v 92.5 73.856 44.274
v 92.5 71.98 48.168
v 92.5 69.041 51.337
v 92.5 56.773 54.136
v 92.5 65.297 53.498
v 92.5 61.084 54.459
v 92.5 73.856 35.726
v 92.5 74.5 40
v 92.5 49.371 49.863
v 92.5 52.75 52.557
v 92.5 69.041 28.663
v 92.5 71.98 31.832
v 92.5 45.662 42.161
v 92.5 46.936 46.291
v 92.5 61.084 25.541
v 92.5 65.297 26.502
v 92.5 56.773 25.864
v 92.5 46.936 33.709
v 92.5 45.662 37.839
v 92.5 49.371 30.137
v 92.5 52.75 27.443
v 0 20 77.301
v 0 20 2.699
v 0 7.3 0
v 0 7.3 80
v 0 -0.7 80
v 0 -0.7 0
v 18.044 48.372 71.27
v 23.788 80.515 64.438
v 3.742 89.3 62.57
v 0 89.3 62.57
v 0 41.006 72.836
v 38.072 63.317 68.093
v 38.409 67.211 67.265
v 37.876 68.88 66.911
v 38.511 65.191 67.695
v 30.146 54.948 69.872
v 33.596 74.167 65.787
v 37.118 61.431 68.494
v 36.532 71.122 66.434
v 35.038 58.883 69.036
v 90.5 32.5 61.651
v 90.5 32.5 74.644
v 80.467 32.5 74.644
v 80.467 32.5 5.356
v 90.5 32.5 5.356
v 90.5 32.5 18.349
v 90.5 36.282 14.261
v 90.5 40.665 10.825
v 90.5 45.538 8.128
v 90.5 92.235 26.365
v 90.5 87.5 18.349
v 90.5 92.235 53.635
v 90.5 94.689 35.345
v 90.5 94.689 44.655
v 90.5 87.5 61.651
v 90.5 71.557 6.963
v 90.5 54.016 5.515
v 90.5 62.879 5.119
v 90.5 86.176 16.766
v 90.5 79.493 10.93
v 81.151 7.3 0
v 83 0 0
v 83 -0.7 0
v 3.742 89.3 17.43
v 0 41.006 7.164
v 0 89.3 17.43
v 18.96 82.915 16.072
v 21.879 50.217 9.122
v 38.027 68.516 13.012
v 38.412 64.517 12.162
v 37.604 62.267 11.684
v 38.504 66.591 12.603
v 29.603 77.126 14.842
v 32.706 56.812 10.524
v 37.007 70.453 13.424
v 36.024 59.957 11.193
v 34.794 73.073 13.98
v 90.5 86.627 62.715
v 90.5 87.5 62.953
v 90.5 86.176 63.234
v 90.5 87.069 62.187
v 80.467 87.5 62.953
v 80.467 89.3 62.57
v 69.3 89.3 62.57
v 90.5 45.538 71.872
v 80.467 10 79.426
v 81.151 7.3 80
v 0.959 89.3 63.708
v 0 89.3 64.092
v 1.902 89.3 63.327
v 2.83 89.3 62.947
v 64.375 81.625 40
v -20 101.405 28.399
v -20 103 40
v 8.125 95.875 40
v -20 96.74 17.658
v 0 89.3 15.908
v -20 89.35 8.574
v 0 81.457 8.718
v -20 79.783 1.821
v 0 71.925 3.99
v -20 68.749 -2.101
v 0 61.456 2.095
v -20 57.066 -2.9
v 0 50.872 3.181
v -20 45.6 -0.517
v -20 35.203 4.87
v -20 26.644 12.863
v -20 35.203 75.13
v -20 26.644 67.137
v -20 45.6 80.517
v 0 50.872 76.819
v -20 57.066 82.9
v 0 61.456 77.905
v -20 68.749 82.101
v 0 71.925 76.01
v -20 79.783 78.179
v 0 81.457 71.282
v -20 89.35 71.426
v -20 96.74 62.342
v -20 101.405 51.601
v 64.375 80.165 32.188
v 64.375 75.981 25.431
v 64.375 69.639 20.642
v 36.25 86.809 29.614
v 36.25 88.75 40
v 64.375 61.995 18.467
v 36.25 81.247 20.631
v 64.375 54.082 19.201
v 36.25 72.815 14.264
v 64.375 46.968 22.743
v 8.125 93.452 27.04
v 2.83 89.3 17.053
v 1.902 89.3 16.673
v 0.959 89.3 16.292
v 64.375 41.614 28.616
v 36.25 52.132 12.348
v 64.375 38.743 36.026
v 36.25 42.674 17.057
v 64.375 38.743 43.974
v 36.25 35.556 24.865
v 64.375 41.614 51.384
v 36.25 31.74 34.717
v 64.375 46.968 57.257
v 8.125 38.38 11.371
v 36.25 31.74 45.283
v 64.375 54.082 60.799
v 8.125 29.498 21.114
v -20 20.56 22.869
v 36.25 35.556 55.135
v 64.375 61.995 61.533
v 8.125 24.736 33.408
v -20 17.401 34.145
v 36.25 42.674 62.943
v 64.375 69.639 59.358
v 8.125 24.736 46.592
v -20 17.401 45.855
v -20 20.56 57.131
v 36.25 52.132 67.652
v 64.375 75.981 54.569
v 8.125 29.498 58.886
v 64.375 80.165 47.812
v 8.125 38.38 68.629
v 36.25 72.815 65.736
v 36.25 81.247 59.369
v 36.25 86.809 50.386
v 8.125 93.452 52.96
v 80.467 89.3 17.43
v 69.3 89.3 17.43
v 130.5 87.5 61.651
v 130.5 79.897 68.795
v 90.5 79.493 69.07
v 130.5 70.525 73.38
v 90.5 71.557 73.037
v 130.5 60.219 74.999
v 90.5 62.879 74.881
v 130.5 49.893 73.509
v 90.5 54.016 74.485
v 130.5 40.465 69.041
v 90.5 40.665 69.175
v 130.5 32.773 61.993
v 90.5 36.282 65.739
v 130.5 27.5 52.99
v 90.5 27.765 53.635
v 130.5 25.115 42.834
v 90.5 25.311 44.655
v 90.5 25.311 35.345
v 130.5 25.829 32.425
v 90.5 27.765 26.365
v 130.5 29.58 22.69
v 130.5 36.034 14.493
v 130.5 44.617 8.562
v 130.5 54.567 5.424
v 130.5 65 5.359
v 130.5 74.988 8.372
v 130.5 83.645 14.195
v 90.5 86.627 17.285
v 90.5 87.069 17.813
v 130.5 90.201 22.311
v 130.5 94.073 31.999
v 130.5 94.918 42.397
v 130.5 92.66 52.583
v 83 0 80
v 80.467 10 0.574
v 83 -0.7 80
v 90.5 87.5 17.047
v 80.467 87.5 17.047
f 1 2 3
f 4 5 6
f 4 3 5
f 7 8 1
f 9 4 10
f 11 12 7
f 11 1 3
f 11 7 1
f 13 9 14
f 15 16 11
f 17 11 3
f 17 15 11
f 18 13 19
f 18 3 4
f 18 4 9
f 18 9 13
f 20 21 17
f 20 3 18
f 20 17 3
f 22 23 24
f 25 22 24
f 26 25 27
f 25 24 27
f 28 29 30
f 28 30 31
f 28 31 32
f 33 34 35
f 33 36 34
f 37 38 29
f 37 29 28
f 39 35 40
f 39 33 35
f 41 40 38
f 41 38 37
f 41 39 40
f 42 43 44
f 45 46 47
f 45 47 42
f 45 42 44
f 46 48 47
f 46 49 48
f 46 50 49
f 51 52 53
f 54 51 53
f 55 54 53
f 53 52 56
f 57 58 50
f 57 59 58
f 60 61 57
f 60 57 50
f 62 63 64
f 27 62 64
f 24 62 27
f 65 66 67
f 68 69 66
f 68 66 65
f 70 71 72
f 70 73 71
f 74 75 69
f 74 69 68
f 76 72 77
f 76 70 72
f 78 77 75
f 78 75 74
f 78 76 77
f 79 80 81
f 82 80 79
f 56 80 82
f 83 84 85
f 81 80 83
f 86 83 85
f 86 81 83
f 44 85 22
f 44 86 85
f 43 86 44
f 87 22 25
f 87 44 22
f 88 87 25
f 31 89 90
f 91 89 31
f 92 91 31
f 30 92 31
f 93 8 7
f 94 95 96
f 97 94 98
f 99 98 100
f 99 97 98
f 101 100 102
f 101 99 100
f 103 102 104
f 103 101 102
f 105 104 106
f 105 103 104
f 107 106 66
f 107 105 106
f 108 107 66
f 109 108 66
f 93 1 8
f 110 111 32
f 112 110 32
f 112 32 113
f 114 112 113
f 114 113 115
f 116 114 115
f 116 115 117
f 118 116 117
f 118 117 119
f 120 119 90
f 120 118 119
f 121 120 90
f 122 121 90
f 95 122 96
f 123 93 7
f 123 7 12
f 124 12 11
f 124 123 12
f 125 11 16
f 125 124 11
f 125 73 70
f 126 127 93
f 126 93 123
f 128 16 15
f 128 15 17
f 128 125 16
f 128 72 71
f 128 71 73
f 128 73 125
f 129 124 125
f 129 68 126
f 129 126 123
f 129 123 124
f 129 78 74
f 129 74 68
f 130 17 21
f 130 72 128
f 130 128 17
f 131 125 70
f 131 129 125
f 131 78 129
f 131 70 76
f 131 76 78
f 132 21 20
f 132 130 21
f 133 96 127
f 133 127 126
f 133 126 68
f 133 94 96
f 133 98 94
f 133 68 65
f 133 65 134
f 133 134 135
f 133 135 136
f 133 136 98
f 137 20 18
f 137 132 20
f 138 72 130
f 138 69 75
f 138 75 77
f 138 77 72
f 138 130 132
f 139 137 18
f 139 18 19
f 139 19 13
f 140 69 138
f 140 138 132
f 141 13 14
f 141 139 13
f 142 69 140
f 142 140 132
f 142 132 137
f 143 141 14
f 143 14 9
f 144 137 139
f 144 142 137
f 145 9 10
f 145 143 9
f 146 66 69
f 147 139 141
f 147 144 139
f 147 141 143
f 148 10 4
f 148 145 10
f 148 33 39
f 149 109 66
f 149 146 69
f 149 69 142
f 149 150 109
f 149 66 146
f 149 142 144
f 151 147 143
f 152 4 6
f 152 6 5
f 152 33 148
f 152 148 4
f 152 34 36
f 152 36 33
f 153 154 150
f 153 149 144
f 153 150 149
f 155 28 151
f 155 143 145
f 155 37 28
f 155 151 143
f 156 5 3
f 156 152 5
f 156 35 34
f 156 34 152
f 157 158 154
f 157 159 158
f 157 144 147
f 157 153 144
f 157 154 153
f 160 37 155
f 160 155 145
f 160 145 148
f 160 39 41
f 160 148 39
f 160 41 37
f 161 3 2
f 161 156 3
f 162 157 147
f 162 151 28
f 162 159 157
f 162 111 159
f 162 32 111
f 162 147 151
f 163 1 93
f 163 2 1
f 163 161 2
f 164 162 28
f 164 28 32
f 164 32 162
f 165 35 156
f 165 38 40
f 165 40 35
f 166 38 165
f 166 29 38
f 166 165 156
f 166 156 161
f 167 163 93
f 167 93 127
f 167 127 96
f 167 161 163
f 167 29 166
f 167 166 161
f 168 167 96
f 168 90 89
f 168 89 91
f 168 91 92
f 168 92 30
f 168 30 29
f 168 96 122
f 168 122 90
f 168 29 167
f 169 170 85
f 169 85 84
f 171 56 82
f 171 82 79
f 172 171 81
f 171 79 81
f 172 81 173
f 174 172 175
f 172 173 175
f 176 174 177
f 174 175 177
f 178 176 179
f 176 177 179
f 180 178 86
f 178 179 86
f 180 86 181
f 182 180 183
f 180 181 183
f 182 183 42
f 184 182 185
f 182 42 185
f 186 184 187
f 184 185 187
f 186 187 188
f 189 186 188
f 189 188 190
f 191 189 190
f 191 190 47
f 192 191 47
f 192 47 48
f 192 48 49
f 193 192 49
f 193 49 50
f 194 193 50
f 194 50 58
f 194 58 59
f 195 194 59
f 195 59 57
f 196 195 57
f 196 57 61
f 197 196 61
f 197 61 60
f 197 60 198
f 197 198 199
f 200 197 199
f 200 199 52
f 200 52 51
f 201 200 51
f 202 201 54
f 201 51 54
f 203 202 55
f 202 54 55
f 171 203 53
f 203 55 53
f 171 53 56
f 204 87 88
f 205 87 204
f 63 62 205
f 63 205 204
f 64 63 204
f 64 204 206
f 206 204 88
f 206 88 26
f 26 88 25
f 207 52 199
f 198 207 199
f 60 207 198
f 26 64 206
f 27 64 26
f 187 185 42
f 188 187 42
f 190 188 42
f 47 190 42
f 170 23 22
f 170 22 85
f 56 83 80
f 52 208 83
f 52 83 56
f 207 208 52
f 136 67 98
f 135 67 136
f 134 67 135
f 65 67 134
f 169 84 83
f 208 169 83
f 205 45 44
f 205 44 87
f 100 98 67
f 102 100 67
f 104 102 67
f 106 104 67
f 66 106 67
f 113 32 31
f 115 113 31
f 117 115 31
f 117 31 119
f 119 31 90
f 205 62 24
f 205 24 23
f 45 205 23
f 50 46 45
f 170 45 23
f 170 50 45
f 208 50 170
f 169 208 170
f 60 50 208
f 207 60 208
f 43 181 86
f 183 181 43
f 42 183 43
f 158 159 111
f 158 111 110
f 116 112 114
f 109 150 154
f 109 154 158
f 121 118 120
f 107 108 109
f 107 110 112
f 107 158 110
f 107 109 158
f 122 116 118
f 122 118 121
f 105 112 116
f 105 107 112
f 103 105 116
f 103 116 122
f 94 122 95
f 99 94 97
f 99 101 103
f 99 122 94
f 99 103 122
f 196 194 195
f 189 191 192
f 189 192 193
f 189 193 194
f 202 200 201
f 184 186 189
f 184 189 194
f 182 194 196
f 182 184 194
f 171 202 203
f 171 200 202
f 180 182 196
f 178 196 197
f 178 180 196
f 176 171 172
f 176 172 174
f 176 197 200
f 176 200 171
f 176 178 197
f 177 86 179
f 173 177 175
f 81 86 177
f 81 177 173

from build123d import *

# Parameters (mm, degrees)
EXTRUDE_1_DEPTH     = 80
SKETCH_2_R          = 35
EXTRUDE_2_DEPTH     = 40
CUT_EXTRUDE_START   = -90.5
CUT_EXTRUDE_1_DEPTH = 90.5


with BuildPart() as part:
    # 草图1 → 凸台-拉伸1 (new body)
    with BuildSketch(Plane.XY):
        Polygon((0, 0), (0, 20), (69.3, 89.3), (80.466666667, 89.3), (80.466666667, 87.5), (90.5, 87.5), (90.5, 32.5), (80.466666667, 32.5), (80.466666667, 10), (83, 0), (83, -0.7), (0, -0.7), align=None)
    extrude(amount=EXTRUDE_1_DEPTH)

    # 草图2 → 凸台-拉伸2 (add)
    with BuildSketch(Plane(origin=(90.5, 0, 0), x_dir=(0, 0, -1), z_dir=(1, 0, 0))):
        with Locations(Location((-40, 60, 0), (0, 0, 128.213210702))):
            Circle(SKETCH_2_R)
    extrude(amount=EXTRUDE_2_DEPTH)


with BuildPart() as body_2:
    # 草图3 → 旋转1 (revolve)
    with BuildSketch(Plane.XY.offset(40)):
        Polygon((92.5, 60), (92.5, 74.5), (-20, 103), (-20, 60), align=None)
    revolve(axis=Axis((92.5, 60, 40), (-1, 0, 0)))


with BuildPart() as cut_extrude_1_tool:
    # 草图5 → 切除-拉伸1 (new body)
    with BuildSketch(Plane.ZY.offset(CUT_EXTRUDE_START)):
        Polygon((0, 7.3), (17.429638057, 89.3), (0, 89.3), align=None)
        Polygon((62.570361943, 89.3), (80, 7.3), (80, 89.3), align=None)
    extrude(amount=CUT_EXTRUDE_1_DEPTH)


with BuildPart() as part_1:
    add(part.part)

    # 切除-拉伸1: cut by cut_extrude_1_tool
    add(cut_extrude_1_tool.part, mode=Mode.SUBTRACT)


with BuildPart() as body_2_1:
    add(body_2.part)

    # 切除-拉伸1: cut by cut_extrude_1_tool
    add(cut_extrude_1_tool.part, mode=Mode.SUBTRACT)


solid = Compound([part_1.part, body_2_1.part])
